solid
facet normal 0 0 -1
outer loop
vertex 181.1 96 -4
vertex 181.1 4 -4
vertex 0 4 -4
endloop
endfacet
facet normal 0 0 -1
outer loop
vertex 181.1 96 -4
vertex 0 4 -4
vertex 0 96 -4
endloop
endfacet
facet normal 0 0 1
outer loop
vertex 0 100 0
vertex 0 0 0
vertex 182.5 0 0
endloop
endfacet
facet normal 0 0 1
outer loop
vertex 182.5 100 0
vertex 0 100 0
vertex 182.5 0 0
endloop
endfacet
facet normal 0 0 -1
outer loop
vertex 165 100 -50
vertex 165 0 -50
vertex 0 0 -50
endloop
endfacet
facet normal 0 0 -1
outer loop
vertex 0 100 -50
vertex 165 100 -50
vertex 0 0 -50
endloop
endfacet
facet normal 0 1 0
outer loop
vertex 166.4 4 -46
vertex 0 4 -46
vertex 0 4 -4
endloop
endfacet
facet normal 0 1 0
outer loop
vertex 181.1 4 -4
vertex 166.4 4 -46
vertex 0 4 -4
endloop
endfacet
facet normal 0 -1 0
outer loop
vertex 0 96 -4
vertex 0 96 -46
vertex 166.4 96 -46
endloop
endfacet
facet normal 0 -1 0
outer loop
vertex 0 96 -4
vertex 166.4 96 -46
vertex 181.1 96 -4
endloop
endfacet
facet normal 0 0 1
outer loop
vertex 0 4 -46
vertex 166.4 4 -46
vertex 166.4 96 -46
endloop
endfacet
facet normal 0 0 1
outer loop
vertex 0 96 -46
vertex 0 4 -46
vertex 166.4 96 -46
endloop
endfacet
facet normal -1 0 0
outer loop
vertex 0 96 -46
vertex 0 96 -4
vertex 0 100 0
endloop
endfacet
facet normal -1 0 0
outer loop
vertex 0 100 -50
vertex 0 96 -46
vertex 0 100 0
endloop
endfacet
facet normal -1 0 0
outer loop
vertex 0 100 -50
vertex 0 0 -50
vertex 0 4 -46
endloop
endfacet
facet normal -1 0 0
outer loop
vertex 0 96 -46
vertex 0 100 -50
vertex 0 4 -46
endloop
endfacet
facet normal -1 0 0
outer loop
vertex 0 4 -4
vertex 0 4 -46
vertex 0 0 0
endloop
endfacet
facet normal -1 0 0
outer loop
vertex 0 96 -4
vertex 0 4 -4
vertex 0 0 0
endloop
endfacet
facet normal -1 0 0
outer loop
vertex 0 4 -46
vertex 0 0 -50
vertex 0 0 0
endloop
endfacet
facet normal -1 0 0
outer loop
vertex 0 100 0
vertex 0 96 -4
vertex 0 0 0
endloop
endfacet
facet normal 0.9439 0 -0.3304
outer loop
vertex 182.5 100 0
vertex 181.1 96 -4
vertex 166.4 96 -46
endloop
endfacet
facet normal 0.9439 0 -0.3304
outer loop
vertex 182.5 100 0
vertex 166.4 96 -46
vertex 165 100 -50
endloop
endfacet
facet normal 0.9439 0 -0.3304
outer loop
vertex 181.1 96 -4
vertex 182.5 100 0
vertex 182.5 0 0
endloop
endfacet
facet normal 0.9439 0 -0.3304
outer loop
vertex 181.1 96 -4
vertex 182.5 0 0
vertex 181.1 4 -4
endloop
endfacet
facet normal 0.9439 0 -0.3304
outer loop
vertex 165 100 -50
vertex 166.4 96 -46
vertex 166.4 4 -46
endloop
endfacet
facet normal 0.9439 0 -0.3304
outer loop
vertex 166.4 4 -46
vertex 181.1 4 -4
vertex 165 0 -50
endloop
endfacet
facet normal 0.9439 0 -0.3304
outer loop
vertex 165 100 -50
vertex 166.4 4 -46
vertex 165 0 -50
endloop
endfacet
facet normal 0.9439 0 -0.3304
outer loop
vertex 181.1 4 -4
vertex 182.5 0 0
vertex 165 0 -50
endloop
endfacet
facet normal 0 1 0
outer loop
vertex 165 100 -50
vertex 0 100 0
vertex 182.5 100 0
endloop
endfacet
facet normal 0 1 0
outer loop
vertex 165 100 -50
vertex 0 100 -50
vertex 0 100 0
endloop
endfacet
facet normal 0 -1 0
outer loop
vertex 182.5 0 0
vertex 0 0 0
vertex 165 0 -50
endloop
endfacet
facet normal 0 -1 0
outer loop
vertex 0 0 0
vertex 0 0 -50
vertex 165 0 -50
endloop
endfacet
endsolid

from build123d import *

# Parameters (mm, degrees)
DODANIE_WYCI_GNI_CIE1_DEPTH = 100
SZKIC2_W                    = 42
SZKIC2_H                    = 92
WYTNIJ_WYCI_GNI_CIE1_DEPTH  = 200


with BuildPart() as part:
    # Szkic1 → Dodanie-wyciągnięcie1 (new body)
    with BuildSketch(Plane(origin=(0, 0, 0), x_dir=(1, 0, 0), z_dir=(0, 1, 0))):
        Polygon((0, 0), (182.5, 0), (165, 50), (0, 50), align=None)
    extrude(amount=DODANIE_WYCI_GNI_CIE1_DEPTH)

    # Szkic2 → Wytnij-wyciągnięcie1 (cut)
    with BuildSketch(Plane.ZY):
        with Locations((-25, 50)):
            Rectangle(SZKIC2_W, SZKIC2_H)
    extrude(amount=-WYTNIJ_WYCI_GNI_CIE1_DEPTH, mode=Mode.SUBTRACT)


solid = part.part
